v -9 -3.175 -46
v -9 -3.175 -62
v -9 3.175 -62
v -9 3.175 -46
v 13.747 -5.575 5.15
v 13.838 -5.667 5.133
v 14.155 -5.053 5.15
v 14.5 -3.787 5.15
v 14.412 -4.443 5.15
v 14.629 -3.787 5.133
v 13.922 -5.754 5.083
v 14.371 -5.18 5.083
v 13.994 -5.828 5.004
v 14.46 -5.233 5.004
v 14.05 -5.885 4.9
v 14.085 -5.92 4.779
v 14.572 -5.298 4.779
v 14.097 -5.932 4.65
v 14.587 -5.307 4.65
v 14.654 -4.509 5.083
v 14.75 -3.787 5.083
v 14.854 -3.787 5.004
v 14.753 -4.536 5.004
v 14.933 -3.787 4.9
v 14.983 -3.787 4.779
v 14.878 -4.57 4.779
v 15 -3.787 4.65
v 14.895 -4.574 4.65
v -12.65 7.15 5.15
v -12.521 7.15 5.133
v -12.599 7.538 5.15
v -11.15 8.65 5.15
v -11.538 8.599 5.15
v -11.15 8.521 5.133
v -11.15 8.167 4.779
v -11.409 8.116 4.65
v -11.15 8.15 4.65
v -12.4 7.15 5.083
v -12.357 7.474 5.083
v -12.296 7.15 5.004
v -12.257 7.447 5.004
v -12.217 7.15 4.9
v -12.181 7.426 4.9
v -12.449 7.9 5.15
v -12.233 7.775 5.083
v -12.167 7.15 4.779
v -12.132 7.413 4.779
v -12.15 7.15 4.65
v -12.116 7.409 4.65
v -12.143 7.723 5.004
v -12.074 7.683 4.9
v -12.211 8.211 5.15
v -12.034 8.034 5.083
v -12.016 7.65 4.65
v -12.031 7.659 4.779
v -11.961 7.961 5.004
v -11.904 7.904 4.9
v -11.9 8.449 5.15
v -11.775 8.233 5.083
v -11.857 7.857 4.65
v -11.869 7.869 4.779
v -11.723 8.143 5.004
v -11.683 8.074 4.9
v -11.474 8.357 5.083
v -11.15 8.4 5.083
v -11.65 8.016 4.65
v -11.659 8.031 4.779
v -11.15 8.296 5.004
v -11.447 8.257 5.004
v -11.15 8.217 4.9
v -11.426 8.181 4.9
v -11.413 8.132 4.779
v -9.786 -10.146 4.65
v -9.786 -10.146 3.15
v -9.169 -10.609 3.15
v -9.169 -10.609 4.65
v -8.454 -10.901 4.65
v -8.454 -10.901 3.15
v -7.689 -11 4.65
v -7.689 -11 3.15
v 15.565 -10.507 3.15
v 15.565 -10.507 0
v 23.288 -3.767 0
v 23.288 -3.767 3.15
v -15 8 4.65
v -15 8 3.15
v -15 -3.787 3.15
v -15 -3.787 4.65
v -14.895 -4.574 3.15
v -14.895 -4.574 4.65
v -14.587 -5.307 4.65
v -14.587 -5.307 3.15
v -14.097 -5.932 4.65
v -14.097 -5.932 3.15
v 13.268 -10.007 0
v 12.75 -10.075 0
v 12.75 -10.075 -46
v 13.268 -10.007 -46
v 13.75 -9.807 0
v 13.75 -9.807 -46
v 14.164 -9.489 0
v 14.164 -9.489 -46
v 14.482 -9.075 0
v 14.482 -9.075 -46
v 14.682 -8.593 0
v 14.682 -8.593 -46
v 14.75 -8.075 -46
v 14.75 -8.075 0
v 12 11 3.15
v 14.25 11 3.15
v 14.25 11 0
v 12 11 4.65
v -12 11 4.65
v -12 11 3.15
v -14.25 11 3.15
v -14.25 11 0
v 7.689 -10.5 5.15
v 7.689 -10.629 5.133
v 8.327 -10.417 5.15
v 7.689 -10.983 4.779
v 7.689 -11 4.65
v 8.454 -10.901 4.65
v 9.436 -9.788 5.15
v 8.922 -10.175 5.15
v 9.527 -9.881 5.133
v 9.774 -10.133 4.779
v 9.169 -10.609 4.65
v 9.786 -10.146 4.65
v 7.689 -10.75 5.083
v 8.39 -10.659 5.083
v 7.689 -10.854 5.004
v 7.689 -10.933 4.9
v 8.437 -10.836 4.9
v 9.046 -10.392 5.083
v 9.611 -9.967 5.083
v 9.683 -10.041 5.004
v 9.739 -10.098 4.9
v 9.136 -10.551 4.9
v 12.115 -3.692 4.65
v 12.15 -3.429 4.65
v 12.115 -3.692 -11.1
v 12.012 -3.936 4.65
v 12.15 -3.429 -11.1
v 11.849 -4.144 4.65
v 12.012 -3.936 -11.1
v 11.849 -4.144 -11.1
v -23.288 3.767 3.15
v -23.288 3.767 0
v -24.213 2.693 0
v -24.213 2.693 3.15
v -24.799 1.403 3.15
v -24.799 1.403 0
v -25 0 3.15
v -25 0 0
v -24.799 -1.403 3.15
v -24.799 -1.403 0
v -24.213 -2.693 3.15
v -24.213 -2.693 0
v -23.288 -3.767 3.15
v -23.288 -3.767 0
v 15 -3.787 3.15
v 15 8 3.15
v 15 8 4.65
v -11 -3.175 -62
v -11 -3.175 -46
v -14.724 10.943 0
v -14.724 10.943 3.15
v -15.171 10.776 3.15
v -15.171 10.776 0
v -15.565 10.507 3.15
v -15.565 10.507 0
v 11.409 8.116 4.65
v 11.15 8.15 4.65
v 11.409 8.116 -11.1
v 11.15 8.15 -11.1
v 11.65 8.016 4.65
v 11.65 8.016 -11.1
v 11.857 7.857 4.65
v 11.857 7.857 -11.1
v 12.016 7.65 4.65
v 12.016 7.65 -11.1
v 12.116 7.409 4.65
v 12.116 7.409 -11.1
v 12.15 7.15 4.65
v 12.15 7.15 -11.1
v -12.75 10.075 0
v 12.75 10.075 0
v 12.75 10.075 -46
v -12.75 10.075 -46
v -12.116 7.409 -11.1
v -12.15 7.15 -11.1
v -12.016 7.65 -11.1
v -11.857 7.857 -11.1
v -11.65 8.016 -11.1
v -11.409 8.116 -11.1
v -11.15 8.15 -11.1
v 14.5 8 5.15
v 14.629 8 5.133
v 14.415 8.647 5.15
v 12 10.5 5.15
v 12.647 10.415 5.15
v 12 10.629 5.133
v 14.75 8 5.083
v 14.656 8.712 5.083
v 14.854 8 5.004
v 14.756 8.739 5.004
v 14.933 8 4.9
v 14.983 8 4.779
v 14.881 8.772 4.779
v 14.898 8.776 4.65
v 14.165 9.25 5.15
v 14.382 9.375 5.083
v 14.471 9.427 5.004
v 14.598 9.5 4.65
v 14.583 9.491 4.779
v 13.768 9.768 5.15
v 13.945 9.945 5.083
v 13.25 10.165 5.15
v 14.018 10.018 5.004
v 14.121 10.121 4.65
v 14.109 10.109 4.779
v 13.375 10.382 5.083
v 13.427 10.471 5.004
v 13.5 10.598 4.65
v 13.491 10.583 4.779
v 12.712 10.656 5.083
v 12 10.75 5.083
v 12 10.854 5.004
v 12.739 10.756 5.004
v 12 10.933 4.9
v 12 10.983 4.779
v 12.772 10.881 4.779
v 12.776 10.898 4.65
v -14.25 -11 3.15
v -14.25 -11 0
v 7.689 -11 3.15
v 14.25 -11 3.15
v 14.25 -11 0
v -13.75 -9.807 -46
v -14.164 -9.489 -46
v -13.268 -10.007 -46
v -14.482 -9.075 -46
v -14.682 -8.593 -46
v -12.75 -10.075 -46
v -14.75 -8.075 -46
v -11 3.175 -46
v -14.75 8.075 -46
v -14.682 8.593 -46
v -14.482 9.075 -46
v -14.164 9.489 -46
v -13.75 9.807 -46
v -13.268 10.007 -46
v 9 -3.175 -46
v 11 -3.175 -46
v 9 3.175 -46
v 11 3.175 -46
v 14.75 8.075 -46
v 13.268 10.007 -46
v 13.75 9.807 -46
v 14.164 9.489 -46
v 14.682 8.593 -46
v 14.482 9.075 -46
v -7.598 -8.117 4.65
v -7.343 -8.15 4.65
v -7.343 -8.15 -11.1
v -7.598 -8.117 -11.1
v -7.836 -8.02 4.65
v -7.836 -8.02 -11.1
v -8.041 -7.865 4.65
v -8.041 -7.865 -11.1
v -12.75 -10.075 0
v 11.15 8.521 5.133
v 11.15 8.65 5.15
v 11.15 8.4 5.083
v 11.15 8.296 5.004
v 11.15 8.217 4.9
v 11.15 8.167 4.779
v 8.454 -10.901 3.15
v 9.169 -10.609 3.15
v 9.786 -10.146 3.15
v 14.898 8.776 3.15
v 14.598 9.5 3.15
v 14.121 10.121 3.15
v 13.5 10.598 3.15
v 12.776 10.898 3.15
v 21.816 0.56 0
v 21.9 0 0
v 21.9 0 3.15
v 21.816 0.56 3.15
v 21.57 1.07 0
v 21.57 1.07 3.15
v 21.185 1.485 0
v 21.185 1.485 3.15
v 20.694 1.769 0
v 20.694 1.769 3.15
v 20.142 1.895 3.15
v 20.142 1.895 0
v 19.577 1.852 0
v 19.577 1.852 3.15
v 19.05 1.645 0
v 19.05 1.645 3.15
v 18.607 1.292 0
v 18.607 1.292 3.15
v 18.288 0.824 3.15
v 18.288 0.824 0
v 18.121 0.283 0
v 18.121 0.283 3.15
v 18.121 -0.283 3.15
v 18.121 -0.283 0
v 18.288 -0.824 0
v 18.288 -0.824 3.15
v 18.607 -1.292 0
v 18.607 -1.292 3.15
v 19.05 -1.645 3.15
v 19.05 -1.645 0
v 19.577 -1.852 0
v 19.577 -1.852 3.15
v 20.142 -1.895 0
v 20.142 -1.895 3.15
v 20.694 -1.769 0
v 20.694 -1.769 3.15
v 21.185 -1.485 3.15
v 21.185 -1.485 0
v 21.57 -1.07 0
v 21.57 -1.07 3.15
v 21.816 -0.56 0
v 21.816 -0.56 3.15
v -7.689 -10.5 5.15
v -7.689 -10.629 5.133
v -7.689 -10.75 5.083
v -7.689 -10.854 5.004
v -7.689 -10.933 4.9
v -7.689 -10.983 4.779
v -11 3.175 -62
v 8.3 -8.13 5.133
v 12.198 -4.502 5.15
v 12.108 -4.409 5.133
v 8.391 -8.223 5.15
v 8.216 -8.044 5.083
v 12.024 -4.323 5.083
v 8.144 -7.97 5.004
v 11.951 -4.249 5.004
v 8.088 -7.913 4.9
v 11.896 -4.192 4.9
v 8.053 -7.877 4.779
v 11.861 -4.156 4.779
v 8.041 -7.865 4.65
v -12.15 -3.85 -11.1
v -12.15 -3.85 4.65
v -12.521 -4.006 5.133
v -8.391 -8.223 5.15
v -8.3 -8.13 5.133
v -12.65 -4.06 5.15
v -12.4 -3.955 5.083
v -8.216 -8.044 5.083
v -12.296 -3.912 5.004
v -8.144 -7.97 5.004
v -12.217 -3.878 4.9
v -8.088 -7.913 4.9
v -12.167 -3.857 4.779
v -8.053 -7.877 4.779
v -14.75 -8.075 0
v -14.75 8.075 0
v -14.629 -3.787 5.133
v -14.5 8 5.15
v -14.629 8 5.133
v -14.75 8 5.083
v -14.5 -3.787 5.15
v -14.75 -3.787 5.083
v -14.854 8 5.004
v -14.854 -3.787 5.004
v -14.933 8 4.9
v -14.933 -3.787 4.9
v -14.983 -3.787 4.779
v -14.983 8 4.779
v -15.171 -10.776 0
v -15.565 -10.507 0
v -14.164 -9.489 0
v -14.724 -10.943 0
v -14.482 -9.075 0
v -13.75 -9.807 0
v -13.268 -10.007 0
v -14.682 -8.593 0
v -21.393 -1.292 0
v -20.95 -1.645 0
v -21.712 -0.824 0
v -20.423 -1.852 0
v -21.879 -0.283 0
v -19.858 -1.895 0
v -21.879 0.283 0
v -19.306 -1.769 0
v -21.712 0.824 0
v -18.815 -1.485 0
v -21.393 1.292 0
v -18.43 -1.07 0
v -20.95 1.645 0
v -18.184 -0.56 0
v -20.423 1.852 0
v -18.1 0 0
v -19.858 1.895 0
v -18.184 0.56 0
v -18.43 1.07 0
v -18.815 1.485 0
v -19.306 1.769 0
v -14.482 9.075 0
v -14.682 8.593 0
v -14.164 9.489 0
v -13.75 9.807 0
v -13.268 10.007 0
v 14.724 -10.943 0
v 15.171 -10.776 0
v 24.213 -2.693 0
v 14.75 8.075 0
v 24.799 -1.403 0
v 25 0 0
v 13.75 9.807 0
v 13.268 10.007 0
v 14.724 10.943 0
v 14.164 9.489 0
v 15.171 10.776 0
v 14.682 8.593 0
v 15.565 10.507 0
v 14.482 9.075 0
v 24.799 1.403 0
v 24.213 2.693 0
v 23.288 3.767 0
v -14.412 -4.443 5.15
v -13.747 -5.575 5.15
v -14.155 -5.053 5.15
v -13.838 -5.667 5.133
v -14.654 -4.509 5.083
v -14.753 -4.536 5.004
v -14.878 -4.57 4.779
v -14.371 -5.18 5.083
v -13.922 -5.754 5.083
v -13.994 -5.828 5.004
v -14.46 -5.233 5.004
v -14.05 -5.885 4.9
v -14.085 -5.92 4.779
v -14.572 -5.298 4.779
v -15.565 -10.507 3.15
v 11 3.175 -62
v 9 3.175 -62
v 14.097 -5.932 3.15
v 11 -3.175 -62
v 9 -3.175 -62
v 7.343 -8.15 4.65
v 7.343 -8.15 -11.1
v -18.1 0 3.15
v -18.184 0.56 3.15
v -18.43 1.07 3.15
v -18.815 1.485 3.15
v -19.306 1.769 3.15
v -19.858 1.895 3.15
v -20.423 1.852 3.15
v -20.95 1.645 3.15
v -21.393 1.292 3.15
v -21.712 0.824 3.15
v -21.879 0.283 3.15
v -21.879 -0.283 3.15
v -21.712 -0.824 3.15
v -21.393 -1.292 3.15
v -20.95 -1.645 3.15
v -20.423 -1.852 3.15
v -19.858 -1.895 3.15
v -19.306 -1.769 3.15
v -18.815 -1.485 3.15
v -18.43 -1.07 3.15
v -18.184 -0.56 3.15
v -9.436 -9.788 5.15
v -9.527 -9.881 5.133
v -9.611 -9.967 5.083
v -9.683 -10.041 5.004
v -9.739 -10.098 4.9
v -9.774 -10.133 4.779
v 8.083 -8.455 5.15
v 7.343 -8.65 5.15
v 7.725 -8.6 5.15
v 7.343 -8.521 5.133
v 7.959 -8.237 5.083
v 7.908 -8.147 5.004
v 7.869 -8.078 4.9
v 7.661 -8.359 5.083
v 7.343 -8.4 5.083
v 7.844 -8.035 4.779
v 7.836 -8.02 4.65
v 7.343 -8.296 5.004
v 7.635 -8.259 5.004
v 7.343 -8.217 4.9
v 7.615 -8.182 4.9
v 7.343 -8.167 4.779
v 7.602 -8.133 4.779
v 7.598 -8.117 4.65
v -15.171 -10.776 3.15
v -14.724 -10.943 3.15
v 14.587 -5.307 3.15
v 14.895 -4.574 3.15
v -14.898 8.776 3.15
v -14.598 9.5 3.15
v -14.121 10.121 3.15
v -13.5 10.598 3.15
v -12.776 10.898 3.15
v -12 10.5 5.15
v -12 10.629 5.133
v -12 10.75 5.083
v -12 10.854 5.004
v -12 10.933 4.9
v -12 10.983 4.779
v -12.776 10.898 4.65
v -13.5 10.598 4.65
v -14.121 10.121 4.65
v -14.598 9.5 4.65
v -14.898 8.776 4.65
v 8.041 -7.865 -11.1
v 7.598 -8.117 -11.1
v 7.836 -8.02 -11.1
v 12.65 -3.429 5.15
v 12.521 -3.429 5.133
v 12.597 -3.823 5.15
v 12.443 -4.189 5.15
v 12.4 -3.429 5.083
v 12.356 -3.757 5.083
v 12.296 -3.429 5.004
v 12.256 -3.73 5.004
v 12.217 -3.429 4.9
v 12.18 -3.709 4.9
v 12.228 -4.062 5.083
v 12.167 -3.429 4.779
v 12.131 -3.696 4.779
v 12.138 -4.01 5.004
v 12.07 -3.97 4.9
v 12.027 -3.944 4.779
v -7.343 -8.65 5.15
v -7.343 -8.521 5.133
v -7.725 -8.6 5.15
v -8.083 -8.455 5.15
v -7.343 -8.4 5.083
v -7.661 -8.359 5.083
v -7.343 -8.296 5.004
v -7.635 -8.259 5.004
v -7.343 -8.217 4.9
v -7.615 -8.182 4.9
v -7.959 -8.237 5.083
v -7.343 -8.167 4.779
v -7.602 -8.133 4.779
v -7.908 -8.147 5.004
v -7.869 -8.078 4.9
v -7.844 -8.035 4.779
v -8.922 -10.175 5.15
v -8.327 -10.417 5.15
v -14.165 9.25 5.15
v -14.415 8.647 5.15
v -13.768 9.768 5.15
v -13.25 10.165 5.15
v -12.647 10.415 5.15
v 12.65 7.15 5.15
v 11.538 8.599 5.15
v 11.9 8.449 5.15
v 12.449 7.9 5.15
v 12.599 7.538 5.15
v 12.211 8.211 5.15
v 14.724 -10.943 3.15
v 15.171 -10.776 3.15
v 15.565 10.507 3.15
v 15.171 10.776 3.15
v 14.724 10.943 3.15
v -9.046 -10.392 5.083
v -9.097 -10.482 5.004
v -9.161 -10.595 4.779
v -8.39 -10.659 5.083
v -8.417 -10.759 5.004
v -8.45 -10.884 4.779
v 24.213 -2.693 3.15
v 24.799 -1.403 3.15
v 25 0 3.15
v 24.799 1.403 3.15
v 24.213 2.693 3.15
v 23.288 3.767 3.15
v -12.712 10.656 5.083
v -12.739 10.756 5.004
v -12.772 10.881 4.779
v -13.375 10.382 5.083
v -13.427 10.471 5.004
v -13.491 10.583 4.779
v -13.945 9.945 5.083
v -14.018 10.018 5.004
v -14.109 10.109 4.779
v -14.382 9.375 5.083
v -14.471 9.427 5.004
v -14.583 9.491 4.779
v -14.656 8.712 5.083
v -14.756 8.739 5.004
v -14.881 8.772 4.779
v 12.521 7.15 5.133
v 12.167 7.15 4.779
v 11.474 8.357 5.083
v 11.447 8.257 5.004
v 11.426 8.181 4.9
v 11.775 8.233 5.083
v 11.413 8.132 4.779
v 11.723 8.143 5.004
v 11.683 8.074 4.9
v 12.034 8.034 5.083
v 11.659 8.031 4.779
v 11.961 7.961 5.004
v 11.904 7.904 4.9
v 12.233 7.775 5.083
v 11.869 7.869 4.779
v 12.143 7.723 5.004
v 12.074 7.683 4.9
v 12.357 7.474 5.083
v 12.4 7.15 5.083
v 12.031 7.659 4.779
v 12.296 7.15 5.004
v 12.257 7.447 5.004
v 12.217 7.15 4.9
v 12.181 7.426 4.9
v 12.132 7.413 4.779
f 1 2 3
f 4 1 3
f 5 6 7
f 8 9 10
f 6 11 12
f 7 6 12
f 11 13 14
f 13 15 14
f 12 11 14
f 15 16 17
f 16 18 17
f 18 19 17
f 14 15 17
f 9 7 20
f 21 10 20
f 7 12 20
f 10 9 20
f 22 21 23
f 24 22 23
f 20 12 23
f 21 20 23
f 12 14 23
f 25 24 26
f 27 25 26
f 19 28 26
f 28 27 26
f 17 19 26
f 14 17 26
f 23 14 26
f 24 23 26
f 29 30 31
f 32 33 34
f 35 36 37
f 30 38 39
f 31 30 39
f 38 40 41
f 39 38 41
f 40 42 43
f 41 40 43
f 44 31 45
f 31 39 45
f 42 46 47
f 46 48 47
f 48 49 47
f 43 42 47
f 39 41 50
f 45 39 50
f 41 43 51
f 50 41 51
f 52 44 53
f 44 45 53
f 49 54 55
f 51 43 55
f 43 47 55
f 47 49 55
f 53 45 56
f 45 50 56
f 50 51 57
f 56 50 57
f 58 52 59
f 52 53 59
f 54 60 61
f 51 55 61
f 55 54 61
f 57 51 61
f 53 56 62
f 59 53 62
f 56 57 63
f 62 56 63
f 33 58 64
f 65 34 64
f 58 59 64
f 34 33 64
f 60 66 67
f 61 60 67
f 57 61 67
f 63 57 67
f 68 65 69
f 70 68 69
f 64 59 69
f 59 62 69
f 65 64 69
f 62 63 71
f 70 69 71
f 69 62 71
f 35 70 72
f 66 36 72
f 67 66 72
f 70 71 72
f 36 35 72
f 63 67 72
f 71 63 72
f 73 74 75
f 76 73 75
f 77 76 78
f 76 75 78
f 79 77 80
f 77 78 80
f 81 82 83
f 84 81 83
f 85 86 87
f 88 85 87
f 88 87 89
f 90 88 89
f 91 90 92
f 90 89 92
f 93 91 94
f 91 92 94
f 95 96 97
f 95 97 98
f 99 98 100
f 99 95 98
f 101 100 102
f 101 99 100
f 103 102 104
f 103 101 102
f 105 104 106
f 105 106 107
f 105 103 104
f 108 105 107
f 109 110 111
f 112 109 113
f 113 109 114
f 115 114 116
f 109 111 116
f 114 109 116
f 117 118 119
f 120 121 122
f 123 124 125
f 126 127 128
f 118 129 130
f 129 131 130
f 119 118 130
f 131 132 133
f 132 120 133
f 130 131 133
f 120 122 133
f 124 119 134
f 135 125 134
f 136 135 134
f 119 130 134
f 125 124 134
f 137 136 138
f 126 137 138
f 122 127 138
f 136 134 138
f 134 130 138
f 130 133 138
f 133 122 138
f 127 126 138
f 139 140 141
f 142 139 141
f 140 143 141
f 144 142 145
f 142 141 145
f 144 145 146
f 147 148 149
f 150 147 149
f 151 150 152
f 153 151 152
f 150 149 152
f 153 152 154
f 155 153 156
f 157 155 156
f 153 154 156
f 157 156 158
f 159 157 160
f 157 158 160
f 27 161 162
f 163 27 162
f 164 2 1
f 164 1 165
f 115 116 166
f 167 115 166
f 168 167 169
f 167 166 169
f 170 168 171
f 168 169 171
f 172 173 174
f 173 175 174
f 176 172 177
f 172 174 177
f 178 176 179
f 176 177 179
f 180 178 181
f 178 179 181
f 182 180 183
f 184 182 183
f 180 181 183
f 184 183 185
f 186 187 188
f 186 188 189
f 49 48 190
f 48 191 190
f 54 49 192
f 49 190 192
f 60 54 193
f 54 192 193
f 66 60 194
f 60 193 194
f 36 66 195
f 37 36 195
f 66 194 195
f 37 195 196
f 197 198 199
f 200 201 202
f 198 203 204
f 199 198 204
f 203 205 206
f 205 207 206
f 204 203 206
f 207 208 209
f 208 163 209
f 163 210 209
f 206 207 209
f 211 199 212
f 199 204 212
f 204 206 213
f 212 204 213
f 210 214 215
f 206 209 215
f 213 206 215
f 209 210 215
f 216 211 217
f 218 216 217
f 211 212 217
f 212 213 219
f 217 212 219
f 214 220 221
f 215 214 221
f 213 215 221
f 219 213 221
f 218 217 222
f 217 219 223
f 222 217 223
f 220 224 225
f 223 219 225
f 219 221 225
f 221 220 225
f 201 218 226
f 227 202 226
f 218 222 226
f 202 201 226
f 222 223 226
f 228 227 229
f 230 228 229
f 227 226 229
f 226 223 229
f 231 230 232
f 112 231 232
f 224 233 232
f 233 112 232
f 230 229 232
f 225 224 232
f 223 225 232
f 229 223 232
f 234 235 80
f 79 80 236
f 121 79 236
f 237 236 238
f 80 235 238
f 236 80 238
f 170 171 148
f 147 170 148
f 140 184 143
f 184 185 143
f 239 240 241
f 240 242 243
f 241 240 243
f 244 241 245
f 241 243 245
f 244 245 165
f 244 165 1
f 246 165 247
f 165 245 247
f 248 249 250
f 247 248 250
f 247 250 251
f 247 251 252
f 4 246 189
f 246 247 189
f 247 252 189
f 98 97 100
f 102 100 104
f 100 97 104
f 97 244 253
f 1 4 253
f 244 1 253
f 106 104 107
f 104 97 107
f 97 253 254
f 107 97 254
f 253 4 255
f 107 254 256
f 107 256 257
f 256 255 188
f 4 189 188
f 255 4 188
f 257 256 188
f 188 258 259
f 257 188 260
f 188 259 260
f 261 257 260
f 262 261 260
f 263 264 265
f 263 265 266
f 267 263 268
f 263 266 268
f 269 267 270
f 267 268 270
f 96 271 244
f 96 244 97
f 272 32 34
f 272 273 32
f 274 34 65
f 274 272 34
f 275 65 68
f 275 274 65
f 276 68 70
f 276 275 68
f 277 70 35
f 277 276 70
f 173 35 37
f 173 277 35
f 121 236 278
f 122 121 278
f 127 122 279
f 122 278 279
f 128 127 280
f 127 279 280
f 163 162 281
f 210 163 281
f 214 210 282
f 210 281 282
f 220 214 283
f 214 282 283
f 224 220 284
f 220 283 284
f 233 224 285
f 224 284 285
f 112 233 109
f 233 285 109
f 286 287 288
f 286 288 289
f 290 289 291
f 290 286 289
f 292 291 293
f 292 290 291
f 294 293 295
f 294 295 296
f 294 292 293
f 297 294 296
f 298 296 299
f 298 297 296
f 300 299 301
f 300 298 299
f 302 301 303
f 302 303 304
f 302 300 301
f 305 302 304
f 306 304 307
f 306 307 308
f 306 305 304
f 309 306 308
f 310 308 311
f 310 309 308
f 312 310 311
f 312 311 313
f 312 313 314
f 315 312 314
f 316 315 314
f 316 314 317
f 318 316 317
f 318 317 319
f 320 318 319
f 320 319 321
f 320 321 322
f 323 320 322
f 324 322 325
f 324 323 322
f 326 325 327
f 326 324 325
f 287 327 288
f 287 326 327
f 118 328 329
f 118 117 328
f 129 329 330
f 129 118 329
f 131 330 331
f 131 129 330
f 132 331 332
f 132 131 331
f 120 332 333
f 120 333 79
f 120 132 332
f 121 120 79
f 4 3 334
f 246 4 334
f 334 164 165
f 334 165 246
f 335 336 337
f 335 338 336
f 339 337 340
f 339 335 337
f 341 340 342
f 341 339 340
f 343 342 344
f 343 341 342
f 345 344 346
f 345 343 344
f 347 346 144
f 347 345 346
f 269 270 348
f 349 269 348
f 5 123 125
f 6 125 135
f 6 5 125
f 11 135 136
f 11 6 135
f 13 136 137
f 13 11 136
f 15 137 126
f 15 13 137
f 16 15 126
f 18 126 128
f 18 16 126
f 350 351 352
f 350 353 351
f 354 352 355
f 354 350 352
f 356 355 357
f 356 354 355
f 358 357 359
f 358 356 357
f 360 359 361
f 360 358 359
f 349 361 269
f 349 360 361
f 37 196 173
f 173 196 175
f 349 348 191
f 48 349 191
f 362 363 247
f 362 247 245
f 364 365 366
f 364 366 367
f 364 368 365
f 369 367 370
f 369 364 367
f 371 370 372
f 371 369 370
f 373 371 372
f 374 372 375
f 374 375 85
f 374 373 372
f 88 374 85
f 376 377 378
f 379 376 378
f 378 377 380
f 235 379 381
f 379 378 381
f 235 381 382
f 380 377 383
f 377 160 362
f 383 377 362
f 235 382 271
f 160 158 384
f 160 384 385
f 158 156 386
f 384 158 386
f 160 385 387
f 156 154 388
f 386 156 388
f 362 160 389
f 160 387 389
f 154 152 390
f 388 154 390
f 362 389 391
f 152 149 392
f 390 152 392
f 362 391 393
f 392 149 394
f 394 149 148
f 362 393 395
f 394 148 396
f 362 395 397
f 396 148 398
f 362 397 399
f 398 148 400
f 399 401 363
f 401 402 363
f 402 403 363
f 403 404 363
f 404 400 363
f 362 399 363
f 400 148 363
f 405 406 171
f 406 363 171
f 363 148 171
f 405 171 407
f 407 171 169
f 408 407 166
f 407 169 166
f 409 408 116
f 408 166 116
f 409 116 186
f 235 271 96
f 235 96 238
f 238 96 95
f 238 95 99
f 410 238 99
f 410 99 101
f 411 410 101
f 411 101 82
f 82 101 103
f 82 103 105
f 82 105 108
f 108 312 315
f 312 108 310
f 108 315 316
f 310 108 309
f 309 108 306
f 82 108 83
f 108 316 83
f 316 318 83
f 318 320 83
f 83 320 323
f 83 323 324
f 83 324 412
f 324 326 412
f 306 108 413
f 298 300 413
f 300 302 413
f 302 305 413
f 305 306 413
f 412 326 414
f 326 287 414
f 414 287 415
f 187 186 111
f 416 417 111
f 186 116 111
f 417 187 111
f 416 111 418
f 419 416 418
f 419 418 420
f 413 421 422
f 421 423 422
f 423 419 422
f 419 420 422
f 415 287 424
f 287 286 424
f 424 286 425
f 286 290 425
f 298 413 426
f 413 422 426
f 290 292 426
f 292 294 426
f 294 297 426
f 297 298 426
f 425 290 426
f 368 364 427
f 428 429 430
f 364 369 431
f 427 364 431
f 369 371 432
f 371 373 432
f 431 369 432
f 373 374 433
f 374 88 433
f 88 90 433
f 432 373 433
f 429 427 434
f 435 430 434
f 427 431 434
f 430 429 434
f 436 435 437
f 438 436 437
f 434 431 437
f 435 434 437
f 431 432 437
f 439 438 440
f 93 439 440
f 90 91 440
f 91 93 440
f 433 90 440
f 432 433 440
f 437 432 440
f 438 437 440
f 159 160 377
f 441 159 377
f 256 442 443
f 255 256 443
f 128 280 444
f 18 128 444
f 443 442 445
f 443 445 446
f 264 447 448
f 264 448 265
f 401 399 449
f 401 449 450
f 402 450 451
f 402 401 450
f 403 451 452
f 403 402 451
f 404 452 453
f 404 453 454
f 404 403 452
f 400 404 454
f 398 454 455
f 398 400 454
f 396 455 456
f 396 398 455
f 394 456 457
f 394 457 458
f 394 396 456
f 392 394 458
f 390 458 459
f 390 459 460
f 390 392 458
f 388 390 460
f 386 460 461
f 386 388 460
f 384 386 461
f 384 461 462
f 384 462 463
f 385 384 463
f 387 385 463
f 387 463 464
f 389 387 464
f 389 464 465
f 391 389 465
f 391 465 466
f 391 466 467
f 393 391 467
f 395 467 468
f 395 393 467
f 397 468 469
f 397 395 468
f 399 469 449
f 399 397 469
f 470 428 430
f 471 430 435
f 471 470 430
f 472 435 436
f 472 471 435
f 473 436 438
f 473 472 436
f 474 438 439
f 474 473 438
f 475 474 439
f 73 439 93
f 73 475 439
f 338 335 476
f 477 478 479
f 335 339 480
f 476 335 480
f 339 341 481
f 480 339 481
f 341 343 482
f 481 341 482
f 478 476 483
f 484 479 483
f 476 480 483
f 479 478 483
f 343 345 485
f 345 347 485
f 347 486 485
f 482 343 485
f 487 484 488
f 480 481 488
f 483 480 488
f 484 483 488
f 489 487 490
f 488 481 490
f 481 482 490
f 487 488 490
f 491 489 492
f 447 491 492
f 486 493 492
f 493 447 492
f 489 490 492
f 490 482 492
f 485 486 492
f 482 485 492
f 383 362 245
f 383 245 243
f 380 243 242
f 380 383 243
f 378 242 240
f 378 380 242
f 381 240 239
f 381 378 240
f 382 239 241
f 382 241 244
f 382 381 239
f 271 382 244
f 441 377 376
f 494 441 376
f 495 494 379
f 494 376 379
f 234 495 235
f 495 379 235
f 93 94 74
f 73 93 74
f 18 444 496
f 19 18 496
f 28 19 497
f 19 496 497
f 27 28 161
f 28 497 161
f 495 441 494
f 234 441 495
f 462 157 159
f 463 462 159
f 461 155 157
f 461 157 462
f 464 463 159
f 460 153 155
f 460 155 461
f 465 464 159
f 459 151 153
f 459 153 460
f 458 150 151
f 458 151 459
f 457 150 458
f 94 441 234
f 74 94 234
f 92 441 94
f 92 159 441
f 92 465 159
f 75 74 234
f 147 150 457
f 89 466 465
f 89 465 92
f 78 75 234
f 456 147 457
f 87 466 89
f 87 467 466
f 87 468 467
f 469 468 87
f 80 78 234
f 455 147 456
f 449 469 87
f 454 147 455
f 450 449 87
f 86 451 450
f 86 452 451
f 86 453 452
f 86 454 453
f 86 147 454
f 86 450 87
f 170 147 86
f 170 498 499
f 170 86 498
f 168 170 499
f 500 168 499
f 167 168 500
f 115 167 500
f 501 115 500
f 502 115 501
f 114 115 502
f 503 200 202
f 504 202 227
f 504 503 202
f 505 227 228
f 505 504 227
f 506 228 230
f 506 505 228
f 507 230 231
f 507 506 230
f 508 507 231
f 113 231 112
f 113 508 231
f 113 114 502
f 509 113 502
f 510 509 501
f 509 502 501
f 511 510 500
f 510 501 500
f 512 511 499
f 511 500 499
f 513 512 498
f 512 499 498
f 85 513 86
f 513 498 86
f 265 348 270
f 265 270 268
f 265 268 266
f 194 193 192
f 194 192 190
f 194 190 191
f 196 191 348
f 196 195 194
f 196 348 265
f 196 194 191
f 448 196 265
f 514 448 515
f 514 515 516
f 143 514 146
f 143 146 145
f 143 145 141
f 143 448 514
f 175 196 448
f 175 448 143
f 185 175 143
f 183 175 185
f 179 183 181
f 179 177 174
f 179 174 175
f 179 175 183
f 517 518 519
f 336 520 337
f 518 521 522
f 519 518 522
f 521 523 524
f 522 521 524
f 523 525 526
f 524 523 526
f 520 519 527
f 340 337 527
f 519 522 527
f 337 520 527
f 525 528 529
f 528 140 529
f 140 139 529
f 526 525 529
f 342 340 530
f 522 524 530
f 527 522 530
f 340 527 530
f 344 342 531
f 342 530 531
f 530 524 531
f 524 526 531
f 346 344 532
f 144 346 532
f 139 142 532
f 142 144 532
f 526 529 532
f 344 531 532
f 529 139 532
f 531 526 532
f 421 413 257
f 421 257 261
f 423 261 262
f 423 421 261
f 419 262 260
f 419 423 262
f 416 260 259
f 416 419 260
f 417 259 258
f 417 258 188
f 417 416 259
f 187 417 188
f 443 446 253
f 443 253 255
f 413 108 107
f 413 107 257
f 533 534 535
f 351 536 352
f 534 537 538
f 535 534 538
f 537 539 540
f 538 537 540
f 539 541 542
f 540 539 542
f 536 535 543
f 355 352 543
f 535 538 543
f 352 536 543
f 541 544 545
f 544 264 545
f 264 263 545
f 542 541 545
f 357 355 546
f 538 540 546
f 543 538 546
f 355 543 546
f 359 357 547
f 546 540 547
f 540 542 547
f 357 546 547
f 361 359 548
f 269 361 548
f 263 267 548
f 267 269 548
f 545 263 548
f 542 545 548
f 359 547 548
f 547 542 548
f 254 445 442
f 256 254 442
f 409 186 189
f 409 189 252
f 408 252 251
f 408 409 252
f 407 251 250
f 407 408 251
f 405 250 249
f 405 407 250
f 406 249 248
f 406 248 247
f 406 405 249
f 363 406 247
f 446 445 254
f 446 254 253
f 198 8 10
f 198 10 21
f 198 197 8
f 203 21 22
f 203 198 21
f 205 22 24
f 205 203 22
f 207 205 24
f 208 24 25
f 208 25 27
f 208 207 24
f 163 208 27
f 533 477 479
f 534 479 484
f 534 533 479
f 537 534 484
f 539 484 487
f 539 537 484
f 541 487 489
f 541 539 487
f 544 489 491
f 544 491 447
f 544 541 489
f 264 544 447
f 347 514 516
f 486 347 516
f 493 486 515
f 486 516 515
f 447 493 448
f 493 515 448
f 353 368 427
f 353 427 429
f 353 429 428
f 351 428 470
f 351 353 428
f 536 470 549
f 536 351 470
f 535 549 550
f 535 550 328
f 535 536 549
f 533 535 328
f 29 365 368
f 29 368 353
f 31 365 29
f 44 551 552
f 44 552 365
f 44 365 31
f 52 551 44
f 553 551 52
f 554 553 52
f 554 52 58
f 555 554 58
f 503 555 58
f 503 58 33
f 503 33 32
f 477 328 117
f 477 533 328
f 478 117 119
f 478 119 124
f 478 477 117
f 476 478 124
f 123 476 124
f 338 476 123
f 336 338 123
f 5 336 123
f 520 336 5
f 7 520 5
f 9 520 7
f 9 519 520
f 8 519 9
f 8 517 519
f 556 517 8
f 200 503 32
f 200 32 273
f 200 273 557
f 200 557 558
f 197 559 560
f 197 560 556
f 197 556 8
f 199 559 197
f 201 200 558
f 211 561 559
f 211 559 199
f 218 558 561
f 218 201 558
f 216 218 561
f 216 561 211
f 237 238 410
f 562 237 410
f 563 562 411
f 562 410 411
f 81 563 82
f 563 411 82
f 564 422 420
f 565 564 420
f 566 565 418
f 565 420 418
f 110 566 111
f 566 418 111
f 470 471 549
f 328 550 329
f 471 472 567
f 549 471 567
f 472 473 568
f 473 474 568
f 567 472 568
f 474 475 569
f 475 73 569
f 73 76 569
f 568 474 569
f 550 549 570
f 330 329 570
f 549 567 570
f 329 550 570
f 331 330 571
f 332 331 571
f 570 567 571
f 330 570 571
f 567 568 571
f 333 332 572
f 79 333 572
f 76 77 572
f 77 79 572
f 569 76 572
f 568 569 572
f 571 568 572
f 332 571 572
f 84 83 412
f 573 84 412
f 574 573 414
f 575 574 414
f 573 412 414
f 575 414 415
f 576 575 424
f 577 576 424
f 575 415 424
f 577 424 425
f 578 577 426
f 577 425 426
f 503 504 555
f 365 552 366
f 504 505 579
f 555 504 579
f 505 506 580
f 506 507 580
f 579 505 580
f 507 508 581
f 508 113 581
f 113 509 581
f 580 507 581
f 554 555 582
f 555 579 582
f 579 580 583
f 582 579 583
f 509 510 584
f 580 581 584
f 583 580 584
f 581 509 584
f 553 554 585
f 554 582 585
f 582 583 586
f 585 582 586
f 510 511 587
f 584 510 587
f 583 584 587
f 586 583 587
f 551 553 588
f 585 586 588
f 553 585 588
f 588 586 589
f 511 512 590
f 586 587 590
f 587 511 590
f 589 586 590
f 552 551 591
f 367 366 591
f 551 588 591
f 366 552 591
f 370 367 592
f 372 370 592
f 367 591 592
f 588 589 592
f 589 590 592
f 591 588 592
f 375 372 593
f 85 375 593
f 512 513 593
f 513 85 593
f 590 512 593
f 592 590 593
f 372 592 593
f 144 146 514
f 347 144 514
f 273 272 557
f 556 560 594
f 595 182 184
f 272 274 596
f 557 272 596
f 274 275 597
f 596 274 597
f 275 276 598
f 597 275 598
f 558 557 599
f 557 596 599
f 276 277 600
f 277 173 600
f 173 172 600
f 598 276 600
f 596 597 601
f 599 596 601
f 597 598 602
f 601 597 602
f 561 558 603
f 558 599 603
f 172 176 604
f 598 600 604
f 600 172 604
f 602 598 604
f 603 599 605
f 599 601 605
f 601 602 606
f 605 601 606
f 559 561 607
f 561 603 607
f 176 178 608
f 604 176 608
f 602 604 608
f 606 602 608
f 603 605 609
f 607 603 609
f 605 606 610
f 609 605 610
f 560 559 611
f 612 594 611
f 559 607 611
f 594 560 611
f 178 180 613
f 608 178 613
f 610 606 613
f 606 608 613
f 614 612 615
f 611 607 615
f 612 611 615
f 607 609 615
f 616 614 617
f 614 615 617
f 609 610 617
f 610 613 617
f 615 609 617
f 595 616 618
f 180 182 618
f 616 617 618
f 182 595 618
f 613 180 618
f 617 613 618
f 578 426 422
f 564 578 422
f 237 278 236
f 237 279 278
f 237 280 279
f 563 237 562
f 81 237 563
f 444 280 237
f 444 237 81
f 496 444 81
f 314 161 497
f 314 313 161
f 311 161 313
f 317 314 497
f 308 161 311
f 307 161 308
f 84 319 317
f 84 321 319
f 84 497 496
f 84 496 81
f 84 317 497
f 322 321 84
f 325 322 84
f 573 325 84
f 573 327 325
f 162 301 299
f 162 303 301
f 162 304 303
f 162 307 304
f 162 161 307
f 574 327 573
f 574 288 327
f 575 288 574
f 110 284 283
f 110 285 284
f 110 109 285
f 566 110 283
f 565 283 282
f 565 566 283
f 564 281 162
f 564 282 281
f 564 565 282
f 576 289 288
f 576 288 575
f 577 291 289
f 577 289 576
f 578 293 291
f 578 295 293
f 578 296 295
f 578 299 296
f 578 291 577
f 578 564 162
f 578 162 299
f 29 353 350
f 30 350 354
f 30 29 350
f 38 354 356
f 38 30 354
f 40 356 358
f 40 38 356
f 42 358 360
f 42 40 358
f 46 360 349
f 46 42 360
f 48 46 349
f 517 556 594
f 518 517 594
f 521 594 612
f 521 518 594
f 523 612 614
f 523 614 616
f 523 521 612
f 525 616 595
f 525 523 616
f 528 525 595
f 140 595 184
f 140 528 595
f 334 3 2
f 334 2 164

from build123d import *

# Parameters (mm, degrees)
SKETCH1_R           = 1.9
BOSS_EXTRUDE1_DEPTH = 3.15
BOSS_EXTRUDE2_DEPTH = 2
FILLET1_R           = 0.5
BOSS_EXTRUDE3_DEPTH = 46
SKETCH4_W           = 2
SKETCH4_H           = 6.35
BOSS_EXTRUDE4_DEPTH = 16
CUT_EXTRUDE1_START  = -11.1
CUT_EXTRUDE1_DEPTH  = 11.1


with BuildPart() as part:
    # Sketch1 → Boss-Extrude1 (new body)
    with BuildSketch(Plane.XY):
        with BuildLine():
            Line((-15.565068493, 10.506849315), (-23.287671233, 3.767123288))
            ThreePointArc((-23.287671233, 3.767123288), (-25, 0), (-23.287671233, -3.767123288))
            Line((-23.287671233, -3.767123288), (-15.565068493, -10.506849315))
            ThreePointArc((-15.565068493, -10.506849315), (-14.952246883, -10.872658355), (-14.25, -11))
            Line((-14.25, -11), (14.25, -11))
            ThreePointArc((14.25, -11), (14.952246883, -10.872658355), (15.565068493, -10.506849315))
            Line((15.565068493, -10.506849315), (23.287671233, -3.767123288))
            ThreePointArc((23.287671233, -3.767123288), (25, 0), (23.287671233, 3.767123288))
            Line((23.287671233, 3.767123288), (15.565068493, 10.506849315))
            ThreePointArc((15.565068493, 10.506849315), (14.952246883, 10.872658355), (14.25, 11))
            Line((14.25, 11), (-14.25, 11))
            ThreePointArc((-14.25, 11), (-14.952246883, 10.872658355), (-15.565068493, 10.506849315))
        make_face()
        with Locations((-20, 0)):
            Circle(SKETCH1_R, mode=Mode.SUBTRACT)
        with Locations((20, 0)):
            Circle(SKETCH1_R, mode=Mode.SUBTRACT)
        with BuildLine():
            Line((7.342503403, -8.15), (-7.342503403, -8.15))
            ThreePointArc((-7.342503403, -8.15), (-7.719871127, -8.076063497), (-8.041436351, -7.865187202))
            Line((-8.041436351, -7.865187202), (-12.15, -3.85))
            Line((-12.15, -3.85), (-12.15, 7.15))
            ThreePointArc((-12.15, 7.15), (-11.857106781, 7.857106781), (-11.15, 8.15))
            Line((-11.15, 8.15), (11.15, 8.15))
            ThreePointArc((11.15, 8.15), (11.857106781, 7.857106781), (12.15, 7.15))
            Line((12.15, 7.15), (12.15, -3.429037417))
            ThreePointArc((12.15, -3.429037417), (12.071665055, -3.817023919), (11.848932948, -4.144224619))
            Line((11.848932948, -4.144224619), (8.041436351, -7.865187202))
            ThreePointArc((8.041436351, -7.865187202), (7.719871127, -8.076063497), (7.342503403, -8.15))
        make_face(mode=Mode.SUBTRACT)
    extrude(amount=BOSS_EXTRUDE1_DEPTH)

    # Sketch2 → Boss-Extrude2 (add)
    with BuildSketch(Plane.XY.offset(3.15)):
        with BuildLine():
            Line((15, -3.786855613), (15, 8))
            ThreePointArc((15, 8), (14.121320344, 10.121320344), (12, 11))
            Line((12, 11), (-12, 11))
            ThreePointArc((-12, 11), (-14.121320344, 10.121320344), (-15, 8))
            Line((-15, 8), (-15, -3.786855613))
            ThreePointArc((-15, -3.786855613), (-14.764995165, -4.95081512), (-14.096798843, -5.93241722))
            Line((-14.096798843, -5.93241722), (-9.785674354, -10.145561607))
            ThreePointArc((-9.785674354, -10.145561607), (-8.820978681, -10.778190492), (-7.68887551, -11))
            Line((-7.68887551, -11), (7.68887551, -11))
            ThreePointArc((7.68887551, -11), (8.820978681, -10.778190492), (9.785674354, -10.145561607))
            Line((9.785674354, -10.145561607), (14.096798843, -5.93241722))
            ThreePointArc((14.096798843, -5.93241722), (14.764995165, -4.95081512), (15, -3.786855613))
        make_face()
        with BuildLine():
            Line((-8.041436351, -7.865187202), (-12.15, -3.85))
            Line((-12.15, -3.85), (-12.15, 7.15))
            ThreePointArc((-12.15, 7.15), (-11.857106781, 7.857106781), (-11.15, 8.15))
            Line((-11.15, 8.15), (11.15, 8.15))
            ThreePointArc((11.15, 8.15), (11.857106781, 7.857106781), (12.15, 7.15))
            Line((12.15, 7.15), (12.15, -3.429037417))
            ThreePointArc((12.15, -3.429037417), (12.071665055, -3.817023919), (11.848932948, -4.144224619))
            Line((11.848932948, -4.144224619), (8.041436351, -7.865187202))
            ThreePointArc((8.041436351, -7.865187202), (7.719871127, -8.076063497), (7.342503403, -8.15))
            Line((7.342503403, -8.15), (-7.342503403, -8.15))
            ThreePointArc((-7.342503403, -8.15), (-7.719871127, -8.076063497), (-8.041436351, -7.865187202))
        make_face(mode=Mode.SUBTRACT)
    extrude(amount=BOSS_EXTRUDE2_DEPTH)

    # Fillet1
    fillet1_edges = [part.edges().sort_by_distance(p)[0] for p in [
        (-12.15, 1.65, 5.15),
        (-10.095718176, -5.857593601, 5.15),
        (8.820978681, -10.778190492, 5.15),
        (11.941236599, -8.038989413, 5.15),
        (14.764995165, -4.95081512, 5.15),
        (15, 2.106572194, 5.15),
        (14.121320344, 10.121320344, 5.15),
        (0, 11, 5.15),
        (-14.121320344, 10.121320344, 5.15),
        (-15, 2.106572194, 5.15),
        (-14.764995165, -4.95081512, 5.15),
        (-11.941236599, -8.038989413, 5.15),
        (-8.820978681, -10.778190492, 5.15),
        (0, -11, 5.15),
        (-7.719871127, -8.076063497, 5.15),
        (0, -8.15, 5.15),
        (7.719871127, -8.076063497, 5.15),
        (9.945184649, -6.004705911, 5.15),
        (12.071665055, -3.817023919, 5.15),
        (12.15, 1.860481292, 5.15),
        (11.857106781, 7.857106781, 5.15),
        (0, 8.15, 5.15),
        (-11.857106781, 7.857106781, 5.15),
    ]]
    fillet(fillet1_edges, radius=FILLET1_R)

    # Sketch3 → Boss-Extrude3 (add)
    with BuildSketch(Plane(origin=(0, 0, 0), x_dir=(-1, 0, 0), z_dir=(0, 0, -1))):
        with BuildLine():
            Line((12.75, -10.075), (-12.75, -10.075))
            ThreePointArc((-12.75, -10.075), (-14.164213562, -9.489213562), (-14.75, -8.075))
            Line((-14.75, -8.075), (-14.75, 8.075))
            ThreePointArc((-14.75, 8.075), (-14.164213562, 9.489213562), (-12.75, 10.075))
            Line((-12.75, 10.075), (12.75, 10.075))
            ThreePointArc((12.75, 10.075), (14.164213562, 9.489213562), (14.75, 8.075))
            Line((14.75, 8.075), (14.75, -8.075))
            ThreePointArc((14.75, -8.075), (14.164213562, -9.489213562), (12.75, -10.075))
        make_face()
    extrude(amount=BOSS_EXTRUDE3_DEPTH)

    # Sketch4 → Boss-Extrude4 (add)
    with BuildSketch(Plane(origin=(0, 0, -46), x_dir=(-1, 0, 0), z_dir=(0, 0, -1))):
        with Locations((-10, 0)):
            Rectangle(SKETCH4_W, SKETCH4_H)
        with Locations((10, 0)):
            Rectangle(SKETCH4_W, SKETCH4_H)
    extrude(amount=BOSS_EXTRUDE4_DEPTH)

    # Sketch5 → Cut-Extrude1 (cut)
    with BuildSketch(Plane.XY.offset(CUT_EXTRUDE1_START)):
        with BuildLine():
            Line((-12.15, 7.15), (-12.15, -3.85))
            Line((-12.15, -3.85), (-8.041436351, -7.865187202))
            ThreePointArc((-8.041436351, -7.865187202), (-7.719871127, -8.076063497), (-7.342503403, -8.15))
            Line((-7.342503403, -8.15), (7.342503403, -8.15))
            ThreePointArc((7.342503403, -8.15), (7.719871127, -8.076063497), (8.041436351, -7.865187202))
            Line((8.041436351, -7.865187202), (11.848932948, -4.144224619))
            ThreePointArc((11.848932948, -4.144224619), (12.071665055, -3.817023919), (12.15, -3.429037417))
            Line((12.15, -3.429037417), (12.15, 7.15))
            ThreePointArc((12.15, 7.15), (11.857106781, 7.857106781), (11.15, 8.15))
            Line((11.15, 8.15), (-11.15, 8.15))
            ThreePointArc((-11.15, 8.15), (-11.857106781, 7.857106781), (-12.15, 7.15))
        make_face()
    extrude(amount=CUT_EXTRUDE1_DEPTH, mode=Mode.SUBTRACT)


solid = part.part
